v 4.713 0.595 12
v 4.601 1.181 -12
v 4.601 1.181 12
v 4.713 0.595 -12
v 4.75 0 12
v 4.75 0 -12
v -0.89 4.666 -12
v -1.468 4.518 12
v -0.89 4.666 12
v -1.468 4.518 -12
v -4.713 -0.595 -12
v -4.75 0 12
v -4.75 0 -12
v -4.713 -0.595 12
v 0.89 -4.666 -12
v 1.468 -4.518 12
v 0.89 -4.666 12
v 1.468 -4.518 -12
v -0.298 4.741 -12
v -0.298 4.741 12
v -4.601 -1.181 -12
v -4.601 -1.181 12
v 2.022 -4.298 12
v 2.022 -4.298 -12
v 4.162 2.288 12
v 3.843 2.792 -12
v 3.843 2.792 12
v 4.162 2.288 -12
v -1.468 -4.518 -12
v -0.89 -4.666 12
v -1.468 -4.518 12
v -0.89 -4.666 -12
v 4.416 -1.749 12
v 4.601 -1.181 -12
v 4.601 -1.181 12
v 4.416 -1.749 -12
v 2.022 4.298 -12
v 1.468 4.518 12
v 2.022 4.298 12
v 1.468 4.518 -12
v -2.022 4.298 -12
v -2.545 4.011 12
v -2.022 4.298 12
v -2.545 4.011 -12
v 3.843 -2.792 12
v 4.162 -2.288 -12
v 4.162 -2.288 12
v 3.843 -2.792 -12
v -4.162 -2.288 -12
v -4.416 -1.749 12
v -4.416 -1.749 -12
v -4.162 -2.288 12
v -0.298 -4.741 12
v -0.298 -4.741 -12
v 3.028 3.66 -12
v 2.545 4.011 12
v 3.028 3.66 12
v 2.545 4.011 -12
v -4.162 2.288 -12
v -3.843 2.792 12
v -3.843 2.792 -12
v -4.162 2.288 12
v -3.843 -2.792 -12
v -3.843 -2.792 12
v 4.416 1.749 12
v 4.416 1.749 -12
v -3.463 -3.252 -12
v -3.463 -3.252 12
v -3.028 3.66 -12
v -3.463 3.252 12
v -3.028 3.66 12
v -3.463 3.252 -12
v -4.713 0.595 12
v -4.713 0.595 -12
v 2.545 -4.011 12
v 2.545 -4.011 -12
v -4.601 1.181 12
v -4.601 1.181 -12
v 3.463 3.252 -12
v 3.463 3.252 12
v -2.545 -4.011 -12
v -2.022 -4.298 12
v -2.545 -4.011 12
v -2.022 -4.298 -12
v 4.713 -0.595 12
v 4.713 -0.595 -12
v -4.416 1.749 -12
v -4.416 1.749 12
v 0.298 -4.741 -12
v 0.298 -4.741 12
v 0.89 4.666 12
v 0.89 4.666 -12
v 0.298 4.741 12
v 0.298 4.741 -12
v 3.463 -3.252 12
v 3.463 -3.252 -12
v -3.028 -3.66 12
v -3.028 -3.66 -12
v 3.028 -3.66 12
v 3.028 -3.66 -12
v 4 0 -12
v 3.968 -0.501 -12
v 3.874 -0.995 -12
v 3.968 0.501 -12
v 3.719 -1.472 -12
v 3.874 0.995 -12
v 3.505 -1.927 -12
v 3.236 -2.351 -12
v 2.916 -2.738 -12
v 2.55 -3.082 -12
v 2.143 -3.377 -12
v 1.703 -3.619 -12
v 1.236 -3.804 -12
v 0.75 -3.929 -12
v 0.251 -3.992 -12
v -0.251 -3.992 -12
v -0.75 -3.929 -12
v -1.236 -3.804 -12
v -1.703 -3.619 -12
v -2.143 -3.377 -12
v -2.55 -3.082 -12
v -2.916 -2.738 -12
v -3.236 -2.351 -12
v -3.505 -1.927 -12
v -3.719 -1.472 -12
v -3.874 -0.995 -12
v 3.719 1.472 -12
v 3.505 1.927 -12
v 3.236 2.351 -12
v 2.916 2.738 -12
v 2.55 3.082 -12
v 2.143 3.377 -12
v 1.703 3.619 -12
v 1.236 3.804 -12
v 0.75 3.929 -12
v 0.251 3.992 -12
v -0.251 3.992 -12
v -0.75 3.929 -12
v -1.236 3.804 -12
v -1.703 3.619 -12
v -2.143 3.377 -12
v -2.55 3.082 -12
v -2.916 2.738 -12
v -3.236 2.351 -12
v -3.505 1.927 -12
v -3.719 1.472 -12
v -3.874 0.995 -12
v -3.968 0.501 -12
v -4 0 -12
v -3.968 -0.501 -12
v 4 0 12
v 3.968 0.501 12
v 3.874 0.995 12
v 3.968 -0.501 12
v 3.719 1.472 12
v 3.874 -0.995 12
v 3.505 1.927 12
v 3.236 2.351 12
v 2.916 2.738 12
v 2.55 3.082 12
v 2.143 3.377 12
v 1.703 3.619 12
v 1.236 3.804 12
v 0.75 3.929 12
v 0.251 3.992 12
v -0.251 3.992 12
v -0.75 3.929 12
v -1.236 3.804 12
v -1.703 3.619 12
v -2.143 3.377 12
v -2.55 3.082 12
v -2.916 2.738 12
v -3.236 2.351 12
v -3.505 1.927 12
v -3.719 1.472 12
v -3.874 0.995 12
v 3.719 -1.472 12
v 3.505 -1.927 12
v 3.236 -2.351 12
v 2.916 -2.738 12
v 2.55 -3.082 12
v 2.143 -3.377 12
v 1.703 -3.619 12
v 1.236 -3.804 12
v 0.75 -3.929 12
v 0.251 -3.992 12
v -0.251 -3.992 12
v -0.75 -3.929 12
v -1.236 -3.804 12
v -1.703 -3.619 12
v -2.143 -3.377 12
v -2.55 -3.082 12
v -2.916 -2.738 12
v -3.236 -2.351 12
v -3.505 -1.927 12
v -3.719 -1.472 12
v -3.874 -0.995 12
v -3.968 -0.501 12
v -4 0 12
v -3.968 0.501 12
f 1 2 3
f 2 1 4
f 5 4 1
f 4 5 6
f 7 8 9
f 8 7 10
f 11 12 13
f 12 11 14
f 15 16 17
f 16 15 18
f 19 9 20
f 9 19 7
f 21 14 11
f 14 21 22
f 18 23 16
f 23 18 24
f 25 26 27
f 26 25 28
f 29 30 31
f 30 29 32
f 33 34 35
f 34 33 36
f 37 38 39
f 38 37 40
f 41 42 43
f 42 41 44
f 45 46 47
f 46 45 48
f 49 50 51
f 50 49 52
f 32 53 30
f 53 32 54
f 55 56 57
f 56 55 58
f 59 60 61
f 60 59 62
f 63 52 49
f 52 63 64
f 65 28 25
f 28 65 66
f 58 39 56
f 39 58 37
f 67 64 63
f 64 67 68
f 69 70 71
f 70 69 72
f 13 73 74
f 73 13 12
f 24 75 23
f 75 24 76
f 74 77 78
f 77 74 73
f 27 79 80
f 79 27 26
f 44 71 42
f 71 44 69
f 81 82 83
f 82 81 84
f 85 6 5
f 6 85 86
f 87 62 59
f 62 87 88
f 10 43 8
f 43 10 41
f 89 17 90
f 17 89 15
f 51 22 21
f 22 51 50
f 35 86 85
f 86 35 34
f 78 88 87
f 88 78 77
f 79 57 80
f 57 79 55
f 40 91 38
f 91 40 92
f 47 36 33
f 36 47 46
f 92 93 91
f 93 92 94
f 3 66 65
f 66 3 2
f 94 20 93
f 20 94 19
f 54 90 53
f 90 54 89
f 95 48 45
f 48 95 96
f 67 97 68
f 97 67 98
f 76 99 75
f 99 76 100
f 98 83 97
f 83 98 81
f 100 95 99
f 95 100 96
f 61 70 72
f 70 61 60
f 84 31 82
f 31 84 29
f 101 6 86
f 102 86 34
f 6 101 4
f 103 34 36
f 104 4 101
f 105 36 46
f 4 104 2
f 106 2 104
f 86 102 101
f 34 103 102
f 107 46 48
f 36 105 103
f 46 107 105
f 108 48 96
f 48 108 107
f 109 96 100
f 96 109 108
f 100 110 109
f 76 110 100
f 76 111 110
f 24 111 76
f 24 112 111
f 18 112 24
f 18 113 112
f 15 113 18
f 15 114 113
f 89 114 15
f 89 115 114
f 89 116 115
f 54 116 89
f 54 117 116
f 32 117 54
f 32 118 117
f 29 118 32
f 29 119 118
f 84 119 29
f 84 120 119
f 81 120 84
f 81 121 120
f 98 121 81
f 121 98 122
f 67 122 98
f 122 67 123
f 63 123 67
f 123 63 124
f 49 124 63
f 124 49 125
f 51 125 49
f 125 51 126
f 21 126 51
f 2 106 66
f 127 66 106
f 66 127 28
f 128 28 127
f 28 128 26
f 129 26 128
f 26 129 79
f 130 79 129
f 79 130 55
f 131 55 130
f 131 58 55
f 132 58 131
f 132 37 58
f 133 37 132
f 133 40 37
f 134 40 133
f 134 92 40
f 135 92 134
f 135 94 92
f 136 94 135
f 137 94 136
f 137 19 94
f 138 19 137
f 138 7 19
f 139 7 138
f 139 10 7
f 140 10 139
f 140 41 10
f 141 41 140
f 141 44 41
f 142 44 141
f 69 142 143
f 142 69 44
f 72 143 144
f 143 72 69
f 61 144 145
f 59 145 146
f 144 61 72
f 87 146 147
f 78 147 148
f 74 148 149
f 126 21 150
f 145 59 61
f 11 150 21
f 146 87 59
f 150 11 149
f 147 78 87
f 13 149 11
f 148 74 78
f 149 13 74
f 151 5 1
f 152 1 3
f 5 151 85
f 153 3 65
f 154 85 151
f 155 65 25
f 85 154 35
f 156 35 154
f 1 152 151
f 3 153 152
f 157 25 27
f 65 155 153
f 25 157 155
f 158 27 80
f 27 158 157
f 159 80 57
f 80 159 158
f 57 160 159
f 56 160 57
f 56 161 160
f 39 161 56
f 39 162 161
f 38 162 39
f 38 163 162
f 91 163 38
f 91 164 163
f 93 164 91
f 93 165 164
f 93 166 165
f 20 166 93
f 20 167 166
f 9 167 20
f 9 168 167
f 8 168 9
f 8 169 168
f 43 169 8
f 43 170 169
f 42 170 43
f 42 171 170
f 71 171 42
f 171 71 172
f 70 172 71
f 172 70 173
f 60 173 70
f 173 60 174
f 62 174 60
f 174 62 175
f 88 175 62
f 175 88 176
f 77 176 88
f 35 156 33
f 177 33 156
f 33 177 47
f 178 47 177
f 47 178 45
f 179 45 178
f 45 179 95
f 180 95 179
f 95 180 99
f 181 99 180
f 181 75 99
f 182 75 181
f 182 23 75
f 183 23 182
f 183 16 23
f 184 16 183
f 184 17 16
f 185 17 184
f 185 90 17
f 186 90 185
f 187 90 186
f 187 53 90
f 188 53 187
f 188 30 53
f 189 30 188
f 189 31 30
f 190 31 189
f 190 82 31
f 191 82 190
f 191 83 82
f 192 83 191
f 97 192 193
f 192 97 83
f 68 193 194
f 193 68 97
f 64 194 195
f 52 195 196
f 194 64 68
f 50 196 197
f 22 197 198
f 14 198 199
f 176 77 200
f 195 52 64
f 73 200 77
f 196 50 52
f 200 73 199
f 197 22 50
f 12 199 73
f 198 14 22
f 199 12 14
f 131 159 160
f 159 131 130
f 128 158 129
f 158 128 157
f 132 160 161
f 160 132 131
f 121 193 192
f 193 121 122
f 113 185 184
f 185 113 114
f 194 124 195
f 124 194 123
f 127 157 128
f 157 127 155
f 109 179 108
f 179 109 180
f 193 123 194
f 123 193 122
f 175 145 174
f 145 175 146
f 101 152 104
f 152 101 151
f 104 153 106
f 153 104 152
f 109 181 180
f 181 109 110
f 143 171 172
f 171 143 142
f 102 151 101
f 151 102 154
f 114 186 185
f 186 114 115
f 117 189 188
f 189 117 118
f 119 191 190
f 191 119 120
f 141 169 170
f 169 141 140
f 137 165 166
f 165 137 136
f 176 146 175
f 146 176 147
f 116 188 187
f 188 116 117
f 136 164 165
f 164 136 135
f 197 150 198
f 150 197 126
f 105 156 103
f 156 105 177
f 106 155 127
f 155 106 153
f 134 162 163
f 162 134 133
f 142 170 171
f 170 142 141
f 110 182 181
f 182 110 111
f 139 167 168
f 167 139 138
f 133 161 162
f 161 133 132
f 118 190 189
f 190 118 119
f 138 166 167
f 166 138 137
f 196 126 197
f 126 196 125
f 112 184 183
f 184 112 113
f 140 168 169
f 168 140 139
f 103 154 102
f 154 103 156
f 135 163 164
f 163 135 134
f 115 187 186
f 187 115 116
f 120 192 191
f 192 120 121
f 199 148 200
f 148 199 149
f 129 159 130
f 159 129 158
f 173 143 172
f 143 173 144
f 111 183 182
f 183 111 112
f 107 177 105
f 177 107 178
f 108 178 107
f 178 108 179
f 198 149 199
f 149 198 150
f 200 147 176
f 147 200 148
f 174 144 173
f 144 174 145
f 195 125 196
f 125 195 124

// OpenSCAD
$fn = 50;


difference() {
	union() {
		translate(v = [0, 0, -12.0000000000]) {
			cylinder(h = 24, r = 4.7500000000);
		}
	}
	union() {
		translate(v = [0, 0, -100.0000000000]) {
			cylinder(h = 200, r = 4.0000000000);
		}
	}
}
